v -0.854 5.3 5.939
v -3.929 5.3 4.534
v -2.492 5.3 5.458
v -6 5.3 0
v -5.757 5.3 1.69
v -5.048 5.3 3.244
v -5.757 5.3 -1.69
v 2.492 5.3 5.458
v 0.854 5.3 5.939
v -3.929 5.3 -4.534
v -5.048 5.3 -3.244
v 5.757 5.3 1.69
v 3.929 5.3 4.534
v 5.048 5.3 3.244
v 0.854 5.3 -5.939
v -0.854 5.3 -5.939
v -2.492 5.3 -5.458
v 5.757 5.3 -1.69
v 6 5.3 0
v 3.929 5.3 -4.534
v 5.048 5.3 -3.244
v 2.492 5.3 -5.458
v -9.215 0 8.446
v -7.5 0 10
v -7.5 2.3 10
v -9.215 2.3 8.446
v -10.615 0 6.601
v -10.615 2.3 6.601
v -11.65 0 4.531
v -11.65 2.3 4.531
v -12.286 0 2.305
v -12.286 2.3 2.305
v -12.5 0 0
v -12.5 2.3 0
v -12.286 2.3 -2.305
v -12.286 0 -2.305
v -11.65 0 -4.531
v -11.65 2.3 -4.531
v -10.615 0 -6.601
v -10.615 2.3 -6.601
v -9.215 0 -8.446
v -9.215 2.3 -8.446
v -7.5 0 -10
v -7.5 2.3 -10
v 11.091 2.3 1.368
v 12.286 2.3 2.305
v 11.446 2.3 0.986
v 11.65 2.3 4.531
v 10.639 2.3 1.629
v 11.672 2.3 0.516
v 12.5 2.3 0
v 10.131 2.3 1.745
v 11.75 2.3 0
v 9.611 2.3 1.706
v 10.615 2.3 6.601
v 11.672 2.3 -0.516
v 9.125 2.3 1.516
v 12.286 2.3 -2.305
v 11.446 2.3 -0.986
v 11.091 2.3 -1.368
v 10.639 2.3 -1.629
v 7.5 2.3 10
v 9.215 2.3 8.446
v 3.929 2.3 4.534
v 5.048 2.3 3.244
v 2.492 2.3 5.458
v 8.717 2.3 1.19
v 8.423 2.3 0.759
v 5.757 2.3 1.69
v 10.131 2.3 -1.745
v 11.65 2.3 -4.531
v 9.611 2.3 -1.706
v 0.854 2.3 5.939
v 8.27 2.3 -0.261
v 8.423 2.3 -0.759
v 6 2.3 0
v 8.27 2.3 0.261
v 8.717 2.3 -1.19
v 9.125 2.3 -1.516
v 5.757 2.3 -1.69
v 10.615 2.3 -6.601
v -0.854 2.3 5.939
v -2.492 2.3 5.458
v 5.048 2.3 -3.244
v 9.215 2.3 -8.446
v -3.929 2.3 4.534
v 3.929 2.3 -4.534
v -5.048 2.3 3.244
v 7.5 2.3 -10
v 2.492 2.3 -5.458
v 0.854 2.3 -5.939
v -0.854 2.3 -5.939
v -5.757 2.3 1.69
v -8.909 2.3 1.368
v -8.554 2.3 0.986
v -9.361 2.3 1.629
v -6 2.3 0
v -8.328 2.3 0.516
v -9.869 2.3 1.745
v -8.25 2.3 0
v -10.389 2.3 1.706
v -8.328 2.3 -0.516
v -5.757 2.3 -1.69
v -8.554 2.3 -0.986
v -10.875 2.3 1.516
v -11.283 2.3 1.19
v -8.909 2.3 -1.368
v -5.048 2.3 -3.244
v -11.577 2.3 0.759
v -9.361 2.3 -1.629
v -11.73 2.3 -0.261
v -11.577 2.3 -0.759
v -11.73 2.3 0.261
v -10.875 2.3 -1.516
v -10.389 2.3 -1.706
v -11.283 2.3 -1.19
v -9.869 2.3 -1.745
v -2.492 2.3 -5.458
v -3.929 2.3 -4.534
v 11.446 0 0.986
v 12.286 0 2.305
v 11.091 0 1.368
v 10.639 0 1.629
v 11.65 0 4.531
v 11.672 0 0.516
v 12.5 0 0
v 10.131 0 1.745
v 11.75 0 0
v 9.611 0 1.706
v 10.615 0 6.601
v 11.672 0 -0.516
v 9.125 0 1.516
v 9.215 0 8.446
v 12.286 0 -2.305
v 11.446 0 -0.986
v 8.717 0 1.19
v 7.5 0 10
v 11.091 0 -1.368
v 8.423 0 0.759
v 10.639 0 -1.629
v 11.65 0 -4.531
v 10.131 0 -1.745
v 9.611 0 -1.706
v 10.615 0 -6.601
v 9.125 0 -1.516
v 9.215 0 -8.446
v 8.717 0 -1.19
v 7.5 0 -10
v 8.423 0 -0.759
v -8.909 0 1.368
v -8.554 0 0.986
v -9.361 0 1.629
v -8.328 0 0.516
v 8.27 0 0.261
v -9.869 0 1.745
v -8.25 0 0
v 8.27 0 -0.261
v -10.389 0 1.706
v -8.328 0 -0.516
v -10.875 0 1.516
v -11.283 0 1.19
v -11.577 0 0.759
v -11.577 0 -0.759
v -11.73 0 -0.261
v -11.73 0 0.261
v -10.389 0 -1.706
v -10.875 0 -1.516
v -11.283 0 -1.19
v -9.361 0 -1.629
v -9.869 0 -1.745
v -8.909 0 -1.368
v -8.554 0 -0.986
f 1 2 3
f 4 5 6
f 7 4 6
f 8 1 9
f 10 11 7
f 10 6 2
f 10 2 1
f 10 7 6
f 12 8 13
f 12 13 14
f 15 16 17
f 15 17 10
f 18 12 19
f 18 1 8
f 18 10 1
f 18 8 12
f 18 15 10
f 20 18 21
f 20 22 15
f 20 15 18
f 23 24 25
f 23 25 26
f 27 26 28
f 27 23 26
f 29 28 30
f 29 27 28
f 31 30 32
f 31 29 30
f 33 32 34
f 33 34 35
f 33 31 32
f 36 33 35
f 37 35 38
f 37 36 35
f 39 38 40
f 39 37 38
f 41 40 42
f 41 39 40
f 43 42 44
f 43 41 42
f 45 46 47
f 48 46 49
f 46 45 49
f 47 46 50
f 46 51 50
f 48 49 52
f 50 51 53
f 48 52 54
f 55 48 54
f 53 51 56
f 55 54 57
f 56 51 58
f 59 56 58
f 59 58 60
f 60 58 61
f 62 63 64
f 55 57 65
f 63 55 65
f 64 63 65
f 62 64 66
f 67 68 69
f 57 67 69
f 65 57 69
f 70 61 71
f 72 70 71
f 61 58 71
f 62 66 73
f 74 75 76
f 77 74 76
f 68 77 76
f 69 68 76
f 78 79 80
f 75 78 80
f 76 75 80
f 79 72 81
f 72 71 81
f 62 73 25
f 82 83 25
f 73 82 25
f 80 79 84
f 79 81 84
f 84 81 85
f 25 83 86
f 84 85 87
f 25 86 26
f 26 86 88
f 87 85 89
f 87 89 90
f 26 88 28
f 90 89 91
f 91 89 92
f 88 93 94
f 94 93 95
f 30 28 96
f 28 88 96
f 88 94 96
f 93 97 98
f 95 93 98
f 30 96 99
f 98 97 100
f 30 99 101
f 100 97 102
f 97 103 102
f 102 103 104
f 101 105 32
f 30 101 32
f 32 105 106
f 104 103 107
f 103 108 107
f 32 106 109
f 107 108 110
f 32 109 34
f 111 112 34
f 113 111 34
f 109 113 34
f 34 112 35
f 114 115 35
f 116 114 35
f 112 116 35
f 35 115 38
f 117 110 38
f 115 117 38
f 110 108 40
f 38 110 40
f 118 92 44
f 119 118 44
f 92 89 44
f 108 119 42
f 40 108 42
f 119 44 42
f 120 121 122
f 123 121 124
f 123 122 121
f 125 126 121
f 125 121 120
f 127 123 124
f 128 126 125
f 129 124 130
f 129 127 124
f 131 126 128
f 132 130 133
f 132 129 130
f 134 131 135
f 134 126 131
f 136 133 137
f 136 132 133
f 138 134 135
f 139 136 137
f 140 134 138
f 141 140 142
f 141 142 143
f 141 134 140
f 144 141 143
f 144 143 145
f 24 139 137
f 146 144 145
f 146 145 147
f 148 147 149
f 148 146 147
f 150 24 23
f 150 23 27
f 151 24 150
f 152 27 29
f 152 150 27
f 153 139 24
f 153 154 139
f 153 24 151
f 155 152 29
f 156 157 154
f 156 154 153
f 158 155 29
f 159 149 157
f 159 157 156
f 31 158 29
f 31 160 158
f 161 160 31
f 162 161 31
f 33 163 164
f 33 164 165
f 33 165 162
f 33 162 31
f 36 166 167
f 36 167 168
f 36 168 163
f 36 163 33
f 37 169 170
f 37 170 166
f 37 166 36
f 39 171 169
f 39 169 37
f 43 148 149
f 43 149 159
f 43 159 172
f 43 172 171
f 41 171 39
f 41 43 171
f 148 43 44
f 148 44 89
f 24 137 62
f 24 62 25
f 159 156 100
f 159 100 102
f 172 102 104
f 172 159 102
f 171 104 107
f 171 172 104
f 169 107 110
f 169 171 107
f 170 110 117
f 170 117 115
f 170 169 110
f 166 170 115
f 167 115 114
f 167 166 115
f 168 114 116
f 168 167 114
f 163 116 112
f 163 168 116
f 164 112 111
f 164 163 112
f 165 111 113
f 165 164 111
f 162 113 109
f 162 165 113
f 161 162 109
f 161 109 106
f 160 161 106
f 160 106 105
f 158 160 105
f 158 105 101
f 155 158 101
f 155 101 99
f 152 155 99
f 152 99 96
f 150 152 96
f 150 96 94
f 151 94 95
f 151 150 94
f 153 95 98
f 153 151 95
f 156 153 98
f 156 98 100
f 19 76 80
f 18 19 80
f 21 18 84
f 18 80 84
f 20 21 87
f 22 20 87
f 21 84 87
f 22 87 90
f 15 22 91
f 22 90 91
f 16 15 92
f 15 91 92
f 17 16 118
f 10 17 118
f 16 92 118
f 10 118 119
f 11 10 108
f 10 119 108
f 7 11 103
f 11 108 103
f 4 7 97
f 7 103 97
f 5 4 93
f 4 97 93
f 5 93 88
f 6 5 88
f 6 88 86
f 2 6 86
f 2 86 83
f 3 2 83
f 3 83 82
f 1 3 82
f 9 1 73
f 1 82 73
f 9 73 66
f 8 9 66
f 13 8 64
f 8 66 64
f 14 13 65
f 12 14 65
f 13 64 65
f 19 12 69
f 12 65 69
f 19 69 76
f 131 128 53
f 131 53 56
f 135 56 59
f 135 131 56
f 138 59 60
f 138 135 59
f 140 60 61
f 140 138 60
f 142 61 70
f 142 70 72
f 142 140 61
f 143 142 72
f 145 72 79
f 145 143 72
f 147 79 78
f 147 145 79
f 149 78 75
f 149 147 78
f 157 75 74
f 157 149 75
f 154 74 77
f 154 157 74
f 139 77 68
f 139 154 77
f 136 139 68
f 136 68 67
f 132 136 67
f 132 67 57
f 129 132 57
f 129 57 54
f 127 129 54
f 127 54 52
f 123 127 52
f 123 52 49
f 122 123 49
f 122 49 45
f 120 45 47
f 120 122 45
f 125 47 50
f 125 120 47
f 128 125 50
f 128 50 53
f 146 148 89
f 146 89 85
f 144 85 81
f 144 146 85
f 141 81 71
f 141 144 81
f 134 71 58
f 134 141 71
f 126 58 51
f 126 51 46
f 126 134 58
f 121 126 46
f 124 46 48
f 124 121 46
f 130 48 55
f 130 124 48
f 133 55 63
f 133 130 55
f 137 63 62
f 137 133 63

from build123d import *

# Parameters (mm, degrees)
SKETCH1_R           = 1.75
BOSS_EXTRUDE1_DEPTH = 2.3
SKETCH3_R           = 6
BOSS_EXTRUDE2_DEPTH = 3


with BuildPart() as part:
    # Sketch1 → Boss-Extrude1 (new body)
    with BuildSketch(Plane(origin=(0, 0, 0), x_dir=(1, 0, 0), z_dir=(0, 1, 0))):
        with BuildLine():
            Line((7.5, -10), (-7.5, -10))
            ThreePointArc((-7.5, -10), (-12.5, 0), (-7.5, 10))
            Line((-7.5, 10), (7.5, 10))
            ThreePointArc((7.5, 10), (12.5, 0), (7.5, -10))
        make_face()
        with Locations((10, 0)):
            Circle(SKETCH1_R, mode=Mode.SUBTRACT)
        with Locations((-10, 0)):
            Circle(SKETCH1_R, mode=Mode.SUBTRACT)
    extrude(amount=BOSS_EXTRUDE1_DEPTH)

    # Sketch3 → Boss-Extrude2 (add)
    with BuildSketch(Plane(origin=(0, 2.3, 0), x_dir=(1, 0, 0), z_dir=(0, 1, 0))):
        Circle(SKETCH3_R)
    extrude(amount=BOSS_EXTRUDE2_DEPTH)


solid = part.part
